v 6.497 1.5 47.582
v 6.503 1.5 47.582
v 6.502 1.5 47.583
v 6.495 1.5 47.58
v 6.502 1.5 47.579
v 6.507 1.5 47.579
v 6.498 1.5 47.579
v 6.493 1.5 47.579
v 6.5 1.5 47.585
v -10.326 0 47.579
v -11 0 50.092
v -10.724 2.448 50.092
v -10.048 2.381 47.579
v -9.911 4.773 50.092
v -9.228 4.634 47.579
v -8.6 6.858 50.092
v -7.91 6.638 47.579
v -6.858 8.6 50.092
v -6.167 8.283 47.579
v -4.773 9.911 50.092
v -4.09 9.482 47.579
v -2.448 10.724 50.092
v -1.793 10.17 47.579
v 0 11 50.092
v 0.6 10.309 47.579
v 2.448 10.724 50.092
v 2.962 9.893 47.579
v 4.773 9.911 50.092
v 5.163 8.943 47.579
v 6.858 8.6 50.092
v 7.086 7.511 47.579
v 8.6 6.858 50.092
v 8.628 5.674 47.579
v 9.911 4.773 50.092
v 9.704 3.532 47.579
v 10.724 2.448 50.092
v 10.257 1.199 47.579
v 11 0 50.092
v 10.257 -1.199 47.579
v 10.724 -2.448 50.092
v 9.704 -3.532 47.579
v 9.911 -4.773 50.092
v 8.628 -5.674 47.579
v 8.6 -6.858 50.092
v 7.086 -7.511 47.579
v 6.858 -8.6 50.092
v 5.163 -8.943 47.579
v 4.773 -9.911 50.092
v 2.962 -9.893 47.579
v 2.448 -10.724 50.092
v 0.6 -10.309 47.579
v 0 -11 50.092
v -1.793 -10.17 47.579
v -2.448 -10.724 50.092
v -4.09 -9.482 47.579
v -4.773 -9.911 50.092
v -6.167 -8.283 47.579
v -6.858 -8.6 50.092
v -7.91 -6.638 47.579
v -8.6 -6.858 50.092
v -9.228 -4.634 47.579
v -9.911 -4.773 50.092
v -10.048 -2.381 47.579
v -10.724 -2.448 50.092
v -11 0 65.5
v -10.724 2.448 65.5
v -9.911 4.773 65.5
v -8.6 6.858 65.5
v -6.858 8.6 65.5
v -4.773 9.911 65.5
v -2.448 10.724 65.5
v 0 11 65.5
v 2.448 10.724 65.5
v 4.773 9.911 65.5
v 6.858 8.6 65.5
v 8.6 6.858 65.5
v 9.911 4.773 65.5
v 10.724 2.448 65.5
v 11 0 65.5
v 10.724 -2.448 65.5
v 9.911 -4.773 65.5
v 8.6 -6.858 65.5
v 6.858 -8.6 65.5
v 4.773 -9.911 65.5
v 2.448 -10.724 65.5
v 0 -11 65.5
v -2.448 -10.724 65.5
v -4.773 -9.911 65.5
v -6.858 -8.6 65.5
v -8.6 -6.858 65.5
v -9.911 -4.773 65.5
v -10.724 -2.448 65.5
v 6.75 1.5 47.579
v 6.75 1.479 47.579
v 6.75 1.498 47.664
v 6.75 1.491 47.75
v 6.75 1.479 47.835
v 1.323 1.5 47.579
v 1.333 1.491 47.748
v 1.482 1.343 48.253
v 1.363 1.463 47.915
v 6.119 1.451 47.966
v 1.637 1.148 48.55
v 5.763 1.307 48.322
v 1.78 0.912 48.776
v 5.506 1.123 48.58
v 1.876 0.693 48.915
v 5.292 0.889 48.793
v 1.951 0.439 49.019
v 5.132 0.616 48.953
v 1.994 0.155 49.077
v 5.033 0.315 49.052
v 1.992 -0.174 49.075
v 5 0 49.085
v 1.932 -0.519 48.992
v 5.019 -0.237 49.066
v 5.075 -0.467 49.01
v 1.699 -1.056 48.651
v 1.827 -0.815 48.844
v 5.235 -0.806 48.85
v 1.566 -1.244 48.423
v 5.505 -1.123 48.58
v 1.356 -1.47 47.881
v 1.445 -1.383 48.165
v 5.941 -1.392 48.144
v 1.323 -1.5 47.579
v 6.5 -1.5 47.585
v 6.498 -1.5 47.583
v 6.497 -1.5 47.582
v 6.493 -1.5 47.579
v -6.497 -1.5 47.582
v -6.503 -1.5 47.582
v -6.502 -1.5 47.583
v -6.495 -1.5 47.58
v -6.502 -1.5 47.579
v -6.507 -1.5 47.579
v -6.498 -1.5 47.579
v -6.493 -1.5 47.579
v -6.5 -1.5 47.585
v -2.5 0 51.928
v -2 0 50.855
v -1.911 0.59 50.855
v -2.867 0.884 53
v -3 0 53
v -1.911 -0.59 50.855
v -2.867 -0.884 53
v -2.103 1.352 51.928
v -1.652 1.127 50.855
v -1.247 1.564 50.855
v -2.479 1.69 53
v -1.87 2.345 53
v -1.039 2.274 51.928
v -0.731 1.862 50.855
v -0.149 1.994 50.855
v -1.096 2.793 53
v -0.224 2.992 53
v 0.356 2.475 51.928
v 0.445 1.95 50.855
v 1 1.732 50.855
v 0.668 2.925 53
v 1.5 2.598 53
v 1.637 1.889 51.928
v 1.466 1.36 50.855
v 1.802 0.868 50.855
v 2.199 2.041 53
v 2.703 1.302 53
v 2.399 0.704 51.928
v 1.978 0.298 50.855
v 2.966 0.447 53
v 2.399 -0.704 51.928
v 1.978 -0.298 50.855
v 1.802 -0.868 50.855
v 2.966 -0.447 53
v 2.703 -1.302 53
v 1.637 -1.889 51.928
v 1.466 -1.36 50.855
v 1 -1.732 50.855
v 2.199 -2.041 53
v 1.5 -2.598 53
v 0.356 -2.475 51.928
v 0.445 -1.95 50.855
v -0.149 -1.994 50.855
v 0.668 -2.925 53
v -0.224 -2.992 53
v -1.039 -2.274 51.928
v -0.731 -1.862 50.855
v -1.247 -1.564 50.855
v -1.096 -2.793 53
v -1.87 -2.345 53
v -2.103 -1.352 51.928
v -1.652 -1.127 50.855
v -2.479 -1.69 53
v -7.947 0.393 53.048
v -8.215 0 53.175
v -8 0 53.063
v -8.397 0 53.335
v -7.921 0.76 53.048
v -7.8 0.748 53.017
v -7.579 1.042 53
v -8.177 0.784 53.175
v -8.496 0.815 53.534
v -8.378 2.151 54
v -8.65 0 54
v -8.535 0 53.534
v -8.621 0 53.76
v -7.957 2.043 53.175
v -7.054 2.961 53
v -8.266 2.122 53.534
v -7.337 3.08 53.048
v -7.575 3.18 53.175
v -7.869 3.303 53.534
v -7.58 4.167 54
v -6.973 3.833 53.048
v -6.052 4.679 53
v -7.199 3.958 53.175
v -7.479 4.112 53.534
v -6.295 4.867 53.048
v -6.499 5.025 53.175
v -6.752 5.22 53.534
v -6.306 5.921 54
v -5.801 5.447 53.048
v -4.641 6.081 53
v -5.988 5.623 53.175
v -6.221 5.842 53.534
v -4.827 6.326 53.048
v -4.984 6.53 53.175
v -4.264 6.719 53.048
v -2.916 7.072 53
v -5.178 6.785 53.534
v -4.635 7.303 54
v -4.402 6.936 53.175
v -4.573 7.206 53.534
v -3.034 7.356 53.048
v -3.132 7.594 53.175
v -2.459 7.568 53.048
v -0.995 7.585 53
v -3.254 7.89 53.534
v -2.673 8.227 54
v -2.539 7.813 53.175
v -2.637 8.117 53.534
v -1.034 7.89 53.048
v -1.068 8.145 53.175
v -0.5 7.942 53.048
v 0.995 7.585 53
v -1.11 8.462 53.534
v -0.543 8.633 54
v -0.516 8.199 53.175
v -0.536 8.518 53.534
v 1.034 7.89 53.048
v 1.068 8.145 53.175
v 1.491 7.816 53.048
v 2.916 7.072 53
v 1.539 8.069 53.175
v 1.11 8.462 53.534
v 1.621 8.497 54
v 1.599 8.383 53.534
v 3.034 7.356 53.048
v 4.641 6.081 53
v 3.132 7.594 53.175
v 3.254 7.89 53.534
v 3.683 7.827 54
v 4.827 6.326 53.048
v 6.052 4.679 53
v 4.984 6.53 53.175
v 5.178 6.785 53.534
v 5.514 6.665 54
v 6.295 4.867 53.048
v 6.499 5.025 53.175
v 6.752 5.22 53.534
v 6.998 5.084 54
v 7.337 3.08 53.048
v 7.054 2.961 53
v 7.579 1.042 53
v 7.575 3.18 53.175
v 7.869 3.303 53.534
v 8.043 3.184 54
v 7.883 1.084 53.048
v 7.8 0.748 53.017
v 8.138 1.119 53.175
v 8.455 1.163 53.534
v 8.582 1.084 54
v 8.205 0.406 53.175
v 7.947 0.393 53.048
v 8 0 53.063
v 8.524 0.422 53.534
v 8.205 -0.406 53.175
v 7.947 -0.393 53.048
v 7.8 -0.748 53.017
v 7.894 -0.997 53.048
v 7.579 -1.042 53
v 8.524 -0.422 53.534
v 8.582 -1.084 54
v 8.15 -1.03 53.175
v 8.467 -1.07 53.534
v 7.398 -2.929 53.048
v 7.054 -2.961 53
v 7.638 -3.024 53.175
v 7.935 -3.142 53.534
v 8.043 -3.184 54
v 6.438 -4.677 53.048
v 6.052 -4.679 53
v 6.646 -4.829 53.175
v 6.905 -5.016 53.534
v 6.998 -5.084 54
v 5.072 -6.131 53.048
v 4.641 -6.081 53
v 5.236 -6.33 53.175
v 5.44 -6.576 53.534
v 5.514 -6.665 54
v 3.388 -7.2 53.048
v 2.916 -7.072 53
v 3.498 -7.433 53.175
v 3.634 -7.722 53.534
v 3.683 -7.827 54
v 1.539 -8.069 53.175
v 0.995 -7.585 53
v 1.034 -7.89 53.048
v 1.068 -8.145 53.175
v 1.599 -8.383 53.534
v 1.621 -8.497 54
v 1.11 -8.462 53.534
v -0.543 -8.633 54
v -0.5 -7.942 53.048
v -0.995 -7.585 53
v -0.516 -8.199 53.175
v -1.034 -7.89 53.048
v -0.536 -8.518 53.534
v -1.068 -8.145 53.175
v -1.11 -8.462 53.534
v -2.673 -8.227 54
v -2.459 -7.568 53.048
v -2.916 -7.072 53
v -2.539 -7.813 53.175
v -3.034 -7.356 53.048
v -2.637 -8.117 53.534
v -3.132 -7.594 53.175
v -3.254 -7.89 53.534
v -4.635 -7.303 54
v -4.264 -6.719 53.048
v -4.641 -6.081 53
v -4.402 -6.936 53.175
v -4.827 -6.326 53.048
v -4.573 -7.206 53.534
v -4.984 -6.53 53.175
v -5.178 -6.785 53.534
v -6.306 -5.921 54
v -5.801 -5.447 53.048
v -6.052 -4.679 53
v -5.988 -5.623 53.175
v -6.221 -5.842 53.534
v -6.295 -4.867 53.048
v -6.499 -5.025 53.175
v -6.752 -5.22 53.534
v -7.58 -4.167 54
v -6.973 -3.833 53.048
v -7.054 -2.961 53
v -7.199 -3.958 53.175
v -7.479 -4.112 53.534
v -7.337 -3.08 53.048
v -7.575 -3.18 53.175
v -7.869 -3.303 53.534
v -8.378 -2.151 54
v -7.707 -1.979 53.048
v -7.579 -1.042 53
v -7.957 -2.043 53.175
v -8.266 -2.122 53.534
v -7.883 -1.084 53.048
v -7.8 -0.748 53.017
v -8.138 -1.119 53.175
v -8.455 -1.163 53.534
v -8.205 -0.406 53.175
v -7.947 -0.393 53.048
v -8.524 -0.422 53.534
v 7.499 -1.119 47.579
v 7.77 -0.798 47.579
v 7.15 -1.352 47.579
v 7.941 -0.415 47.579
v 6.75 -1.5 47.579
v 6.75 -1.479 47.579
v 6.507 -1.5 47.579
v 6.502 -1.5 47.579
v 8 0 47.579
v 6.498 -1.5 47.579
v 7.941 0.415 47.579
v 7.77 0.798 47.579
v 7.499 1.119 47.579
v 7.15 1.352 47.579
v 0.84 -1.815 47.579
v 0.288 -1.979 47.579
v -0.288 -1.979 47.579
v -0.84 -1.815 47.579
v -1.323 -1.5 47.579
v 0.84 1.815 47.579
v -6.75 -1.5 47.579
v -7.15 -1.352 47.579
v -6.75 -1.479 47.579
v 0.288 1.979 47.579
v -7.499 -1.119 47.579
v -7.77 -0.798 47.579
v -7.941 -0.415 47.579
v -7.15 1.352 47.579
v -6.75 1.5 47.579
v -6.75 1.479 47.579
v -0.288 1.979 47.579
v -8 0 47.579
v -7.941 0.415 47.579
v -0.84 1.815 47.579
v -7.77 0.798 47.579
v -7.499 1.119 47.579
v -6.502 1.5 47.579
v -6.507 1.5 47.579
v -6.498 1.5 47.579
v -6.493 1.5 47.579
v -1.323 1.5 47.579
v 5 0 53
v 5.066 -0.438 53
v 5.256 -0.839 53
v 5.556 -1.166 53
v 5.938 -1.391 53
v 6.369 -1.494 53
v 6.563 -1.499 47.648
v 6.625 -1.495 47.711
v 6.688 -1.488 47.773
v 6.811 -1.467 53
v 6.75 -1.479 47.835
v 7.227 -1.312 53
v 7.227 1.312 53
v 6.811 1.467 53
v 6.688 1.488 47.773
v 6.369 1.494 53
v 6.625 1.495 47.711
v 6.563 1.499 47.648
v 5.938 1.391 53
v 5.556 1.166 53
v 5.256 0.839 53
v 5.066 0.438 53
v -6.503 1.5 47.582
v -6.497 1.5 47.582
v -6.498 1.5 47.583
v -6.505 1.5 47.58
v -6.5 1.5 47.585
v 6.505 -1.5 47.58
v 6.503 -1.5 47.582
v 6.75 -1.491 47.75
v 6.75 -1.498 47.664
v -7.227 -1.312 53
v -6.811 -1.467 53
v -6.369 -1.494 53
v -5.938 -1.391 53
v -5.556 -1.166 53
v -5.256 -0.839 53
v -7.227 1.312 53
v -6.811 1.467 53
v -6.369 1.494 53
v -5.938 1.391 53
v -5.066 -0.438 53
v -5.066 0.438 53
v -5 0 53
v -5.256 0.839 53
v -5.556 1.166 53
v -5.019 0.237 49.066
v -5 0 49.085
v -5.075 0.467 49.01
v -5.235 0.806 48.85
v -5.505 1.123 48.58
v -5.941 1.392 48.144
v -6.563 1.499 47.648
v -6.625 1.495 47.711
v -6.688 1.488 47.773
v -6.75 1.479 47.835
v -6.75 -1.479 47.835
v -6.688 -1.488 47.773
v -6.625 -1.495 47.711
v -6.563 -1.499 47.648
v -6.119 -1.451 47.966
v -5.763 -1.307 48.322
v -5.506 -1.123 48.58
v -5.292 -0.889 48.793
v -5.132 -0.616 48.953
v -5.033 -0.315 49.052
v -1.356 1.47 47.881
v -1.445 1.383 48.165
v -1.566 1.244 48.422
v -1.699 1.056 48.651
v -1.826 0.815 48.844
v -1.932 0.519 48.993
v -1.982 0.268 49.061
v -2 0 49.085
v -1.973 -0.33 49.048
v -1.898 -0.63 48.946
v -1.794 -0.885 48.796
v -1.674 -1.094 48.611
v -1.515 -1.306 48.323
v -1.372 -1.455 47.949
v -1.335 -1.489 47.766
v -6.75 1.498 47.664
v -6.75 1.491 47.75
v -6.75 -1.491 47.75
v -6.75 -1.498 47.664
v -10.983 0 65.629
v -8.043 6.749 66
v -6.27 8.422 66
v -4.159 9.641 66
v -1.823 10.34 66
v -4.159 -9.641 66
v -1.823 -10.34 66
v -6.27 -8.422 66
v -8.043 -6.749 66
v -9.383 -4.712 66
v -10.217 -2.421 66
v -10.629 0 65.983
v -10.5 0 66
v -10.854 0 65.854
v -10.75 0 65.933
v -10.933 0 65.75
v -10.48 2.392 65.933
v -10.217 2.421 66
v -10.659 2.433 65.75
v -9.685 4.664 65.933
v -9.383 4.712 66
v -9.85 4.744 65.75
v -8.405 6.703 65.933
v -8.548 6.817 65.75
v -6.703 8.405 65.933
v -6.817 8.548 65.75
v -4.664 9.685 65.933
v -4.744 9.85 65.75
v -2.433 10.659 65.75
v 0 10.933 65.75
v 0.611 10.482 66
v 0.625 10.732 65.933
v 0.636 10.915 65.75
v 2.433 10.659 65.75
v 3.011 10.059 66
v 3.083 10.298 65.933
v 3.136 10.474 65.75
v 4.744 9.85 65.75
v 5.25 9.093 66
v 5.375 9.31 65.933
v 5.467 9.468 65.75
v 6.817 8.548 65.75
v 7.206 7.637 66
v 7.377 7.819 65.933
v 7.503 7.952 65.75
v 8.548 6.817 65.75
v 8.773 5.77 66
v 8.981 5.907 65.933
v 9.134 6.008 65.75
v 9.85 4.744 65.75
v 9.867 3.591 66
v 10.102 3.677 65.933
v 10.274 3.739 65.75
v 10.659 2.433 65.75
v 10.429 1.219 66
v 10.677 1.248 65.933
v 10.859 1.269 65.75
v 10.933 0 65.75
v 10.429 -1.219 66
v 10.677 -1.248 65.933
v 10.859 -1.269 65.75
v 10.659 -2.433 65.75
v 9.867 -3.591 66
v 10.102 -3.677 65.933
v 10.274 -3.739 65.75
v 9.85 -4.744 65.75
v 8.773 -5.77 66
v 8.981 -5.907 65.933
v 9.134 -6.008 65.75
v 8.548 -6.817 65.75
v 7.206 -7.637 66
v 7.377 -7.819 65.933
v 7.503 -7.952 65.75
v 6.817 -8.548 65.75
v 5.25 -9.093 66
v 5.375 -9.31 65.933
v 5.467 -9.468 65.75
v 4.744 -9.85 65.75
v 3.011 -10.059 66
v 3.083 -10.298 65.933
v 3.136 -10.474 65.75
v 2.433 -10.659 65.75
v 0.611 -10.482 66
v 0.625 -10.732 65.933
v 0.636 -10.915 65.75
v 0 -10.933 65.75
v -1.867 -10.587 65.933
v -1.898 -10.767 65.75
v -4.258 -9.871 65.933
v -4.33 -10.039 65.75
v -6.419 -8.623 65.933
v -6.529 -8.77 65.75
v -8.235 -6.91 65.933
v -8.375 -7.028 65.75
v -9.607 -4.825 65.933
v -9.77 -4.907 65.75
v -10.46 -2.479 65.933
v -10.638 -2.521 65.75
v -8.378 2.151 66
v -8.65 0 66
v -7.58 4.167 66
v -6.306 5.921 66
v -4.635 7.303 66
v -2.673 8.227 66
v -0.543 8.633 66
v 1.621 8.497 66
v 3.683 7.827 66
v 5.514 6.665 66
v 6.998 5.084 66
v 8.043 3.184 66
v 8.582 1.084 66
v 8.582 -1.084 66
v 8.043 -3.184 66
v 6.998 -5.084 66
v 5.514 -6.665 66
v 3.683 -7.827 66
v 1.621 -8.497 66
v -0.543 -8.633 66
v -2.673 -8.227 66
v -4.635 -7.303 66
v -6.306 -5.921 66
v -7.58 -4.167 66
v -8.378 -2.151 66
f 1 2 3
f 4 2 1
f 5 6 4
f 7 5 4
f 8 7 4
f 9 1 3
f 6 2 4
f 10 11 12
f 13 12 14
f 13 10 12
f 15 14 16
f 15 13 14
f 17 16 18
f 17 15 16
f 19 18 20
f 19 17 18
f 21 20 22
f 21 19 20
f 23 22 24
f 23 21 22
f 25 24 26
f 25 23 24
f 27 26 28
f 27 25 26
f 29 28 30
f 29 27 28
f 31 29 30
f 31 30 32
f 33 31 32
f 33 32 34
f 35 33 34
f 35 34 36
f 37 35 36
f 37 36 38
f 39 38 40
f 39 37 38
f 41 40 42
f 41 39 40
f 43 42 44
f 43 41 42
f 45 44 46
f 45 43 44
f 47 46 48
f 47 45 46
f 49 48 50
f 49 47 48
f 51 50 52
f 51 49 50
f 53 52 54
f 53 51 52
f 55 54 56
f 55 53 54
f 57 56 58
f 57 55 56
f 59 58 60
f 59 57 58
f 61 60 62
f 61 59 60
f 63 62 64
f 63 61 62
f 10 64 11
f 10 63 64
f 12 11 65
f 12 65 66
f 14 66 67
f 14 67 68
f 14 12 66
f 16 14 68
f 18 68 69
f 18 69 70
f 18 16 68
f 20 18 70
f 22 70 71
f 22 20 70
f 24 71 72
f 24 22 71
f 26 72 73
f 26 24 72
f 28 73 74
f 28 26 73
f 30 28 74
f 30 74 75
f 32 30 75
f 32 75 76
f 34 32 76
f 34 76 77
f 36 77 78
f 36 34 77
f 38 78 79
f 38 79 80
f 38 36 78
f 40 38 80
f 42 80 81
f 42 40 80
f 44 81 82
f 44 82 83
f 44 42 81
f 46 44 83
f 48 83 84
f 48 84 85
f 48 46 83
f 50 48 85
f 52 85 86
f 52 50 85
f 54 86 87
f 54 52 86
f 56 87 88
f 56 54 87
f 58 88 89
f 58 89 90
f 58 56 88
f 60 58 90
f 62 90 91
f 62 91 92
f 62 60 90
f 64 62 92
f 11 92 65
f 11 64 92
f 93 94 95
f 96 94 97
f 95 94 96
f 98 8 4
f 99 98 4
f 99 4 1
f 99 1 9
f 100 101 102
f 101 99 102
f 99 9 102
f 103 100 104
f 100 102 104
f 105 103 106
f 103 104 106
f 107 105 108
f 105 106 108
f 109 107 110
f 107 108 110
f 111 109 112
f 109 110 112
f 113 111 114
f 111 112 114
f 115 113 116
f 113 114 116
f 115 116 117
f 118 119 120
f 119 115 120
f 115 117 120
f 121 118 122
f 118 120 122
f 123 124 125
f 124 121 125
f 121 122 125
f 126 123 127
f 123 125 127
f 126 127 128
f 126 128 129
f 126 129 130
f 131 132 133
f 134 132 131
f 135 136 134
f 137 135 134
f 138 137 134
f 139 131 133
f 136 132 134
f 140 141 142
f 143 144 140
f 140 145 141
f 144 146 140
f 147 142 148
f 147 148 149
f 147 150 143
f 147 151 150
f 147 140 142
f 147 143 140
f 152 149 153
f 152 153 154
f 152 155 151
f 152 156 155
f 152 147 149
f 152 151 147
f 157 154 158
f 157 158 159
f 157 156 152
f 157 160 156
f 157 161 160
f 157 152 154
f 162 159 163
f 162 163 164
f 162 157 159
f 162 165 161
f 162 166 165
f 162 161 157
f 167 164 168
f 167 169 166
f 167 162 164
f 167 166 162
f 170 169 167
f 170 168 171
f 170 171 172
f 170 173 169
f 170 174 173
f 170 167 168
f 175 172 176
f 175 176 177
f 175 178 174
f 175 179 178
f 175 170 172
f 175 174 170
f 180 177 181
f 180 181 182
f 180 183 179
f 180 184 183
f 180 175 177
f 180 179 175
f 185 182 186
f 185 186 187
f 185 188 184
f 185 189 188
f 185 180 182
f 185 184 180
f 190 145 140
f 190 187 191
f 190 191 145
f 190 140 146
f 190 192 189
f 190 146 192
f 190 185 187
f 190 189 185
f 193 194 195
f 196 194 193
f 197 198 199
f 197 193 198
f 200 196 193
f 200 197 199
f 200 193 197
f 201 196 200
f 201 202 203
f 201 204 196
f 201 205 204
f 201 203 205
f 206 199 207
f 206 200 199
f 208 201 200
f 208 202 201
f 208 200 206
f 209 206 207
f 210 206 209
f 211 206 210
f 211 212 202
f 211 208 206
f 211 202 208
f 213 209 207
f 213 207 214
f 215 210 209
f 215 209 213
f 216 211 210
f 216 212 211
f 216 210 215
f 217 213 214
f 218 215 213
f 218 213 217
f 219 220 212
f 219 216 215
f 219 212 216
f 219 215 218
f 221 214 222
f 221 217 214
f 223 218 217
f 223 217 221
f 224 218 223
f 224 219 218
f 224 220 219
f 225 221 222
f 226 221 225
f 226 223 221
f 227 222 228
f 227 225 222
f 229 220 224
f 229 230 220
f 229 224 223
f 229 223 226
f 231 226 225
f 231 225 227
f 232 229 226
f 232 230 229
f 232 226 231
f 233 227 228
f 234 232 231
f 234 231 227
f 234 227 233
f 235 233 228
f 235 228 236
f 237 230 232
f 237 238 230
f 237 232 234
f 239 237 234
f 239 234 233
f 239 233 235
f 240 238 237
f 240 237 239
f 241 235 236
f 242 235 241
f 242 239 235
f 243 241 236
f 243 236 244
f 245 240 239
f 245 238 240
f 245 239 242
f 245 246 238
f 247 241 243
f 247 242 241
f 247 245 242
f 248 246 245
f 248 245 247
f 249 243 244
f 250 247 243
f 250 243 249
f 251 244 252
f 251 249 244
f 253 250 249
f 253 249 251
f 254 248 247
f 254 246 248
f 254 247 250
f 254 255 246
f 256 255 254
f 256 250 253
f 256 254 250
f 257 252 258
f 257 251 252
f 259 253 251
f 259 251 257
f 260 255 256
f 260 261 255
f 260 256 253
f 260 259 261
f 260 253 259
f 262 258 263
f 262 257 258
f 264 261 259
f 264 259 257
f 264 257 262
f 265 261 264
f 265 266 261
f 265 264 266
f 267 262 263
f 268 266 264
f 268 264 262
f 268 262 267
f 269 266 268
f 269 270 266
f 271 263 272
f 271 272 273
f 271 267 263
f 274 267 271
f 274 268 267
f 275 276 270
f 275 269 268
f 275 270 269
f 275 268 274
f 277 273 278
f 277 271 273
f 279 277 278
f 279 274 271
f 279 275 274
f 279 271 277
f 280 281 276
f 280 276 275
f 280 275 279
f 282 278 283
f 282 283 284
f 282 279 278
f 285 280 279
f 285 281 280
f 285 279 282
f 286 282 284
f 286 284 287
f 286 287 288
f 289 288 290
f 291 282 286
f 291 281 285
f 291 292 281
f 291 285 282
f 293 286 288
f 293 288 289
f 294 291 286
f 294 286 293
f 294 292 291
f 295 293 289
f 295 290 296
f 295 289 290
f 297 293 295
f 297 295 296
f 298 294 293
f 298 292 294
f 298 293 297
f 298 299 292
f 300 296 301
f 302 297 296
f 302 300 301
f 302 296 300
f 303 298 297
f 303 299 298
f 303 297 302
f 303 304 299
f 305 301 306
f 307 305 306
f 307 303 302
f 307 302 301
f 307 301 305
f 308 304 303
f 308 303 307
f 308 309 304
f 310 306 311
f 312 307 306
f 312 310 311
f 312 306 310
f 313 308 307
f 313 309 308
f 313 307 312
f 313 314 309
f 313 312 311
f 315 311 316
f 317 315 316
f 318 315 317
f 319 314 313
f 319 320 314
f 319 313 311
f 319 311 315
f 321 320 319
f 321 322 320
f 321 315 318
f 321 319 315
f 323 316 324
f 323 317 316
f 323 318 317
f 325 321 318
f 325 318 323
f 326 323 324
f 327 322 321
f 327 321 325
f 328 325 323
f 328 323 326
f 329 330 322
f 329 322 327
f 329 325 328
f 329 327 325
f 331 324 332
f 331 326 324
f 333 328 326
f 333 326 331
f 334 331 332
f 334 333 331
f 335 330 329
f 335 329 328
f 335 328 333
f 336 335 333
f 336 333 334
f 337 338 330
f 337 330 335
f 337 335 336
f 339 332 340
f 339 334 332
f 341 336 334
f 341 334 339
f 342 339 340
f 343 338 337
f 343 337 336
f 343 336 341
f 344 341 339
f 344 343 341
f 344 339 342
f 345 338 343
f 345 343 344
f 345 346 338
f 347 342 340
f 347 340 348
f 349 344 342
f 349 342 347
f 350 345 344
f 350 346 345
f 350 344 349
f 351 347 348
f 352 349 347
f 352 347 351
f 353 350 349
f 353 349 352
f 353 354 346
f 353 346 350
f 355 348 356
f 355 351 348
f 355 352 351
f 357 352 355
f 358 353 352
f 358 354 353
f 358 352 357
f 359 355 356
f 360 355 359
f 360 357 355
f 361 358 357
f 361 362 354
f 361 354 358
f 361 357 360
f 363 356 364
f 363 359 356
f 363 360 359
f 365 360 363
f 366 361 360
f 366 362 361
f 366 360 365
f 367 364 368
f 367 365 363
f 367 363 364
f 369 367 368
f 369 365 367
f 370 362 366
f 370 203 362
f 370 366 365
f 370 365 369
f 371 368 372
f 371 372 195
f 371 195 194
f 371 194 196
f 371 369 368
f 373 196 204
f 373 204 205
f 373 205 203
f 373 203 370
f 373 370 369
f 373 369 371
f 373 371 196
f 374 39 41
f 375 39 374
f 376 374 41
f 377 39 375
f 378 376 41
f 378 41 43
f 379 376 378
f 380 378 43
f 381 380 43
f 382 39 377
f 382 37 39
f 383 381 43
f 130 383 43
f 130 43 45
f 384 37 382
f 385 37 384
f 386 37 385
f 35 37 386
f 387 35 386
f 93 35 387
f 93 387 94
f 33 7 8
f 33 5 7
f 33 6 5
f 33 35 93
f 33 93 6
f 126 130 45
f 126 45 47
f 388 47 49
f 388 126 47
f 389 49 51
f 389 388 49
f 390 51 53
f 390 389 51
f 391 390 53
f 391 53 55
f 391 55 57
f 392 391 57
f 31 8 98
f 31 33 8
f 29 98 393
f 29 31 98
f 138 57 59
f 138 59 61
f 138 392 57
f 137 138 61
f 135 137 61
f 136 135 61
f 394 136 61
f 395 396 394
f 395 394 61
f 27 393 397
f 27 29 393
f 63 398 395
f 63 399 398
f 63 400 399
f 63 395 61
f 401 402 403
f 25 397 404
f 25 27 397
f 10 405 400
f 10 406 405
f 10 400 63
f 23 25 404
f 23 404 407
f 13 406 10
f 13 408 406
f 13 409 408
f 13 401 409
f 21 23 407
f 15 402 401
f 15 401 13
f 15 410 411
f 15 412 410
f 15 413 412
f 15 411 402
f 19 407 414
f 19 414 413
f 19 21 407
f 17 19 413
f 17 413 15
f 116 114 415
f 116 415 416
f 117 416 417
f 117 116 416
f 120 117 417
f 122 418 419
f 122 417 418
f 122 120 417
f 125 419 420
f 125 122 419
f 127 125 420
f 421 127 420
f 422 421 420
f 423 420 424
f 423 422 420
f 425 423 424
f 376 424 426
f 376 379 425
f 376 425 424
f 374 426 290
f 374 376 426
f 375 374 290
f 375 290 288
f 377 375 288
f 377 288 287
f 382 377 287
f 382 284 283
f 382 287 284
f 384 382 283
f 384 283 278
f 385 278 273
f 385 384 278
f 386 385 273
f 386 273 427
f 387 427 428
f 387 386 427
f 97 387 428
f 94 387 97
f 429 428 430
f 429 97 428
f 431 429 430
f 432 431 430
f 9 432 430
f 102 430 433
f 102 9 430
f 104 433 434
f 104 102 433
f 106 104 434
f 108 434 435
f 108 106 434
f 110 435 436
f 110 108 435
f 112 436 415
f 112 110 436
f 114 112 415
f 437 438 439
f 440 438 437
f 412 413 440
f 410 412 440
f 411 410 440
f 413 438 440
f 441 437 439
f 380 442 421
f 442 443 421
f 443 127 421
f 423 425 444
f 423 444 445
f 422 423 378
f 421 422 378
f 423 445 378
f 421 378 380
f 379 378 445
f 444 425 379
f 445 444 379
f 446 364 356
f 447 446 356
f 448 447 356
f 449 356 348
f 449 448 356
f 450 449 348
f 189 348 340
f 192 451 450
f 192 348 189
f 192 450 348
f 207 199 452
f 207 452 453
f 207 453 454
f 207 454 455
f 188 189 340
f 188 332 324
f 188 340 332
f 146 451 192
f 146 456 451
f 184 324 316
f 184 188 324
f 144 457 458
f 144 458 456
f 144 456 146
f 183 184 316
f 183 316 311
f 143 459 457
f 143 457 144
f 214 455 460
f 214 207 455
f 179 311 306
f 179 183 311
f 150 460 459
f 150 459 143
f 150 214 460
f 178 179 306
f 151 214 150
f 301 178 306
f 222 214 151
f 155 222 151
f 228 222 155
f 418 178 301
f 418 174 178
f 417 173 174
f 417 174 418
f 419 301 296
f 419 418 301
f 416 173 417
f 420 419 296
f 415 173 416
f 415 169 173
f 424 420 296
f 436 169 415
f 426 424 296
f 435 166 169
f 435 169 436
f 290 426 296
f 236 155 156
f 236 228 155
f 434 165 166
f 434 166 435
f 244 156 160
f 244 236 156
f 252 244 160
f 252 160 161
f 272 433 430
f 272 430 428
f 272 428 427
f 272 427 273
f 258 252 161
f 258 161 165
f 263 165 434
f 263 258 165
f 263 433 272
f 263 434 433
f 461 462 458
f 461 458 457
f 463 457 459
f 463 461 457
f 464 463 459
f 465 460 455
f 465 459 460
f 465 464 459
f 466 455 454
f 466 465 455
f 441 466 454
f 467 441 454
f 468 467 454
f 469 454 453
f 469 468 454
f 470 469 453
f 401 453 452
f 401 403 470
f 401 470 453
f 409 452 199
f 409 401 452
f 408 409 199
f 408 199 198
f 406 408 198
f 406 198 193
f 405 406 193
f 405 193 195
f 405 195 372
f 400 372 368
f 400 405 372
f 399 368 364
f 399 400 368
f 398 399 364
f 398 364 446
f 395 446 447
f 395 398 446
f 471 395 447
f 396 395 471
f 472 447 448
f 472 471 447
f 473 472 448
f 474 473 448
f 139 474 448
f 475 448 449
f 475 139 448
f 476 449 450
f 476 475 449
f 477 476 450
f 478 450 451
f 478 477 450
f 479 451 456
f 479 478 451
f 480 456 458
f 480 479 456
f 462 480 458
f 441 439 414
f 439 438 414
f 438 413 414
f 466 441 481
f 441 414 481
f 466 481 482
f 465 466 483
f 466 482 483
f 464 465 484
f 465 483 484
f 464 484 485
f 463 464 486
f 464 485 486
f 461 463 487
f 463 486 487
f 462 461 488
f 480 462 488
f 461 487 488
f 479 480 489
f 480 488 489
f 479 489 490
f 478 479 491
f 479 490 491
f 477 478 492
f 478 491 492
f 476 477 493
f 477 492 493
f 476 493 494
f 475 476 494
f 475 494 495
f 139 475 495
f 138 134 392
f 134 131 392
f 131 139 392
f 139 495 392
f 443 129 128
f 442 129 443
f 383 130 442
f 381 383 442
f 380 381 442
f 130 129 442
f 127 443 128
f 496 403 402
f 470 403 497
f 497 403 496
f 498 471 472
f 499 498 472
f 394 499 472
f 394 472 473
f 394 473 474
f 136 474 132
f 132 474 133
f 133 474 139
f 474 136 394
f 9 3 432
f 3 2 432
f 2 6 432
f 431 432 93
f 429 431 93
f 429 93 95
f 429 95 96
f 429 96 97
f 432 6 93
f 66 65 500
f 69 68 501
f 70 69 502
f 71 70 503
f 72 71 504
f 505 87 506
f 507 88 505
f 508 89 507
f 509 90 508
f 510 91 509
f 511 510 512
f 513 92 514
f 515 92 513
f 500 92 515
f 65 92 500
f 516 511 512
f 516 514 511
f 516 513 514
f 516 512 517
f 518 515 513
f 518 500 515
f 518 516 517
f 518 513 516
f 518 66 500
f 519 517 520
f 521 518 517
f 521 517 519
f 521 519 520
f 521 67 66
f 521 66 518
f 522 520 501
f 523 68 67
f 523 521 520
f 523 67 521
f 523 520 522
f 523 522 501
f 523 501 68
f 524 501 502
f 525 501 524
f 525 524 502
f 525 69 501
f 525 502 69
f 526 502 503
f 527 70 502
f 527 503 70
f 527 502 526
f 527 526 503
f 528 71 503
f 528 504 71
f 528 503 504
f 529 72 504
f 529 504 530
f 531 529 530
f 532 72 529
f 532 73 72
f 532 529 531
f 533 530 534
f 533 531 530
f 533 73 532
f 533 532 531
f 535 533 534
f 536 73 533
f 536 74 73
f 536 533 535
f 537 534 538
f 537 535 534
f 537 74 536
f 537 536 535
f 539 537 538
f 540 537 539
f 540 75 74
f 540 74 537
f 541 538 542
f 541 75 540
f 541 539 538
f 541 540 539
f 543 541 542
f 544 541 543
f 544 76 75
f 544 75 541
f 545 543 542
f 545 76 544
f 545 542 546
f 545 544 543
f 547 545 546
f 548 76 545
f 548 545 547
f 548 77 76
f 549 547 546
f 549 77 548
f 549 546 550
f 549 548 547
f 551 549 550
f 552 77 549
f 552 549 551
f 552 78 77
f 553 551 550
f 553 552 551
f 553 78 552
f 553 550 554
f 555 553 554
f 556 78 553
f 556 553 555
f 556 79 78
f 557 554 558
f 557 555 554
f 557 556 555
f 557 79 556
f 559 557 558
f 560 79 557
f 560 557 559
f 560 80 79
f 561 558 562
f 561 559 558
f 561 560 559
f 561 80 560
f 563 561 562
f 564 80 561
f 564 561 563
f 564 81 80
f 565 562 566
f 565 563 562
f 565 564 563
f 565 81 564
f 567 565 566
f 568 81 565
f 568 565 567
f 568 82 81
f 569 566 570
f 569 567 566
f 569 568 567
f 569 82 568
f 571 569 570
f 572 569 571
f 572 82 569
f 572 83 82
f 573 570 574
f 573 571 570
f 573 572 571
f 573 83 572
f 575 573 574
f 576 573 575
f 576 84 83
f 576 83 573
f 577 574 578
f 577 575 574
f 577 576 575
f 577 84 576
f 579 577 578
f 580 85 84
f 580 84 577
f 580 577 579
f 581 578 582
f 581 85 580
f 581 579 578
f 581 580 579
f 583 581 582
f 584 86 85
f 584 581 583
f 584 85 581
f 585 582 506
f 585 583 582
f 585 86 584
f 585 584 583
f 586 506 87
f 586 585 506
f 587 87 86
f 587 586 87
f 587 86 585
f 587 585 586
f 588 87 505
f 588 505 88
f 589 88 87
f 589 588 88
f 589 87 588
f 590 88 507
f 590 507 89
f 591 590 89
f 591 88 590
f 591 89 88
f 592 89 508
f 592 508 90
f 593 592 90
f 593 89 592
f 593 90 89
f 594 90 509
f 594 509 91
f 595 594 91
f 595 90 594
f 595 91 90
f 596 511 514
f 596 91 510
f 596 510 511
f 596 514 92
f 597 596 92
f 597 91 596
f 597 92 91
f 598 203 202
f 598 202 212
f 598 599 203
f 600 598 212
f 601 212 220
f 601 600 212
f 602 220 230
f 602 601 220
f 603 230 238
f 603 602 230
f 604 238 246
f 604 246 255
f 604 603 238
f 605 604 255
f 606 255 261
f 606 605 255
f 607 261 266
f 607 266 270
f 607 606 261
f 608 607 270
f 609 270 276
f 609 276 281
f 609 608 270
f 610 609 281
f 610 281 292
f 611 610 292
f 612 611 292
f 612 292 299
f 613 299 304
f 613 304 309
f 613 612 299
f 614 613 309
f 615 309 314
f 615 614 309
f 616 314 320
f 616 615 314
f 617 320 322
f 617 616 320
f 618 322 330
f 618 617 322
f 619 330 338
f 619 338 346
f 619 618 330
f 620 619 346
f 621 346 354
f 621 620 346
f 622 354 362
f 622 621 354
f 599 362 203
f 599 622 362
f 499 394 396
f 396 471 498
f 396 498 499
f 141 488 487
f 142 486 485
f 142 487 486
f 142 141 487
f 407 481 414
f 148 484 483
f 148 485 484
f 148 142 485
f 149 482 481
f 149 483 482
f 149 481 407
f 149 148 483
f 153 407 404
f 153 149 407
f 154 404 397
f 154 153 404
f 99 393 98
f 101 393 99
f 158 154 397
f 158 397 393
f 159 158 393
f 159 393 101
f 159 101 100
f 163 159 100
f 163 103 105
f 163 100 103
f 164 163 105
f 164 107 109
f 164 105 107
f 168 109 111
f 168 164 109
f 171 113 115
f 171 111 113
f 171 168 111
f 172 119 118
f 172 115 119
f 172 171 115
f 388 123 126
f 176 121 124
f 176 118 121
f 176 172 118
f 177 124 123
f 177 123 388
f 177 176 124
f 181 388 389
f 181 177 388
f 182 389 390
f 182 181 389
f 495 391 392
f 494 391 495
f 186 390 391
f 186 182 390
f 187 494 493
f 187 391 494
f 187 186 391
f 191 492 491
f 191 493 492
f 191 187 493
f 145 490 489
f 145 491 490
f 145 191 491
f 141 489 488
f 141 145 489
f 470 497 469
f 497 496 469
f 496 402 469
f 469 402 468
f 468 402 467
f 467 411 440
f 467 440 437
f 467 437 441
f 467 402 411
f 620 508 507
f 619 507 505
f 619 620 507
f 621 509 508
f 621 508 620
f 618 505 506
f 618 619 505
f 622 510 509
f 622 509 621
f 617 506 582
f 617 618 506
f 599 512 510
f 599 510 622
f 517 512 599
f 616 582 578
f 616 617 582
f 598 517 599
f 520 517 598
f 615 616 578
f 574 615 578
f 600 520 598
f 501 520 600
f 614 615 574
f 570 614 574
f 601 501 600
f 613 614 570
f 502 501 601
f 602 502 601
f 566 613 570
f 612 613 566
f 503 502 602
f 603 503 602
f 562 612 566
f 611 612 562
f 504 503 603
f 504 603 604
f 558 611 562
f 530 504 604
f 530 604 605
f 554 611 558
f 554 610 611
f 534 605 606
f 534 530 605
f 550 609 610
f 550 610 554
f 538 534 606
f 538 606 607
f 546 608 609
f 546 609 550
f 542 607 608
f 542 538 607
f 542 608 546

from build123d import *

# Parameters (mm, degrees)
F2_R     = 1.5
F3_DEPTH = 80
F4_R     = 0.5
F5_R     = 1.5
F6_DEPTH = 6.75


# Not quite as in the source:
# - a feature names something its author has since deleted; it is built from what else it names


with BuildPart() as f1:
    # F0 (on Front) → F1 (revolve)
    with BuildSketch(Plane.XZ):
        with BuildLine():
            Line((-8.65, 66), (-11, 66))
            Line((-11, 66), (-11, 50.0923395157))
            Line((-11, 50.0923395157), (-10.3264193874, 47.5785024464))
            Line((-10.3264193874, 47.5785024464), (-2, 47.5785024464))
            Line((-2, 47.5785024464), (-2, 50.8554930795))
            Line((-2, 50.8554930795), (-3, 53))
            Line((-3, 53), (-7.65, 53))
            ThreePointArc((-7.65, 53), (-8.3571067812, 53.2928932188), (-8.65, 54))
            Line((-8.65, 54), (-8.65, 66))
        make_face()
    revolve(axis=Axis((0, 0, 14.8610904367), (0, 0, -1)))

    # F2 (on Top) → F3 (cut)
    with BuildSketch(Plane.XY):
        with Locations((-6.5, 0)):
            Circle(F2_R)
        with BuildLine():
            ThreePointArc((8, 0), (6.5, 1.5), (5, 0))
            ThreePointArc((5, 0), (6.5, -1.5), (8, 0))
        make_face()
    extrude(amount=F3_DEPTH, mode=Mode.SUBTRACT)

    # F4
    f4_edges = [f1.edges().sort_by_distance(p)[0] for p in [
        (11, 0, 66),
    ]]
    fillet(f4_edges, radius=F4_R)

    # F5 (on Right) → F6 (cut, symmetric)
    with BuildSketch(Plane.YZ):
        with Locations((0, 47.5850664079)):
            Circle(F5_R)
    extrude(amount=F6_DEPTH, both=True, mode=Mode.SUBTRACT)


solid = f1.part
